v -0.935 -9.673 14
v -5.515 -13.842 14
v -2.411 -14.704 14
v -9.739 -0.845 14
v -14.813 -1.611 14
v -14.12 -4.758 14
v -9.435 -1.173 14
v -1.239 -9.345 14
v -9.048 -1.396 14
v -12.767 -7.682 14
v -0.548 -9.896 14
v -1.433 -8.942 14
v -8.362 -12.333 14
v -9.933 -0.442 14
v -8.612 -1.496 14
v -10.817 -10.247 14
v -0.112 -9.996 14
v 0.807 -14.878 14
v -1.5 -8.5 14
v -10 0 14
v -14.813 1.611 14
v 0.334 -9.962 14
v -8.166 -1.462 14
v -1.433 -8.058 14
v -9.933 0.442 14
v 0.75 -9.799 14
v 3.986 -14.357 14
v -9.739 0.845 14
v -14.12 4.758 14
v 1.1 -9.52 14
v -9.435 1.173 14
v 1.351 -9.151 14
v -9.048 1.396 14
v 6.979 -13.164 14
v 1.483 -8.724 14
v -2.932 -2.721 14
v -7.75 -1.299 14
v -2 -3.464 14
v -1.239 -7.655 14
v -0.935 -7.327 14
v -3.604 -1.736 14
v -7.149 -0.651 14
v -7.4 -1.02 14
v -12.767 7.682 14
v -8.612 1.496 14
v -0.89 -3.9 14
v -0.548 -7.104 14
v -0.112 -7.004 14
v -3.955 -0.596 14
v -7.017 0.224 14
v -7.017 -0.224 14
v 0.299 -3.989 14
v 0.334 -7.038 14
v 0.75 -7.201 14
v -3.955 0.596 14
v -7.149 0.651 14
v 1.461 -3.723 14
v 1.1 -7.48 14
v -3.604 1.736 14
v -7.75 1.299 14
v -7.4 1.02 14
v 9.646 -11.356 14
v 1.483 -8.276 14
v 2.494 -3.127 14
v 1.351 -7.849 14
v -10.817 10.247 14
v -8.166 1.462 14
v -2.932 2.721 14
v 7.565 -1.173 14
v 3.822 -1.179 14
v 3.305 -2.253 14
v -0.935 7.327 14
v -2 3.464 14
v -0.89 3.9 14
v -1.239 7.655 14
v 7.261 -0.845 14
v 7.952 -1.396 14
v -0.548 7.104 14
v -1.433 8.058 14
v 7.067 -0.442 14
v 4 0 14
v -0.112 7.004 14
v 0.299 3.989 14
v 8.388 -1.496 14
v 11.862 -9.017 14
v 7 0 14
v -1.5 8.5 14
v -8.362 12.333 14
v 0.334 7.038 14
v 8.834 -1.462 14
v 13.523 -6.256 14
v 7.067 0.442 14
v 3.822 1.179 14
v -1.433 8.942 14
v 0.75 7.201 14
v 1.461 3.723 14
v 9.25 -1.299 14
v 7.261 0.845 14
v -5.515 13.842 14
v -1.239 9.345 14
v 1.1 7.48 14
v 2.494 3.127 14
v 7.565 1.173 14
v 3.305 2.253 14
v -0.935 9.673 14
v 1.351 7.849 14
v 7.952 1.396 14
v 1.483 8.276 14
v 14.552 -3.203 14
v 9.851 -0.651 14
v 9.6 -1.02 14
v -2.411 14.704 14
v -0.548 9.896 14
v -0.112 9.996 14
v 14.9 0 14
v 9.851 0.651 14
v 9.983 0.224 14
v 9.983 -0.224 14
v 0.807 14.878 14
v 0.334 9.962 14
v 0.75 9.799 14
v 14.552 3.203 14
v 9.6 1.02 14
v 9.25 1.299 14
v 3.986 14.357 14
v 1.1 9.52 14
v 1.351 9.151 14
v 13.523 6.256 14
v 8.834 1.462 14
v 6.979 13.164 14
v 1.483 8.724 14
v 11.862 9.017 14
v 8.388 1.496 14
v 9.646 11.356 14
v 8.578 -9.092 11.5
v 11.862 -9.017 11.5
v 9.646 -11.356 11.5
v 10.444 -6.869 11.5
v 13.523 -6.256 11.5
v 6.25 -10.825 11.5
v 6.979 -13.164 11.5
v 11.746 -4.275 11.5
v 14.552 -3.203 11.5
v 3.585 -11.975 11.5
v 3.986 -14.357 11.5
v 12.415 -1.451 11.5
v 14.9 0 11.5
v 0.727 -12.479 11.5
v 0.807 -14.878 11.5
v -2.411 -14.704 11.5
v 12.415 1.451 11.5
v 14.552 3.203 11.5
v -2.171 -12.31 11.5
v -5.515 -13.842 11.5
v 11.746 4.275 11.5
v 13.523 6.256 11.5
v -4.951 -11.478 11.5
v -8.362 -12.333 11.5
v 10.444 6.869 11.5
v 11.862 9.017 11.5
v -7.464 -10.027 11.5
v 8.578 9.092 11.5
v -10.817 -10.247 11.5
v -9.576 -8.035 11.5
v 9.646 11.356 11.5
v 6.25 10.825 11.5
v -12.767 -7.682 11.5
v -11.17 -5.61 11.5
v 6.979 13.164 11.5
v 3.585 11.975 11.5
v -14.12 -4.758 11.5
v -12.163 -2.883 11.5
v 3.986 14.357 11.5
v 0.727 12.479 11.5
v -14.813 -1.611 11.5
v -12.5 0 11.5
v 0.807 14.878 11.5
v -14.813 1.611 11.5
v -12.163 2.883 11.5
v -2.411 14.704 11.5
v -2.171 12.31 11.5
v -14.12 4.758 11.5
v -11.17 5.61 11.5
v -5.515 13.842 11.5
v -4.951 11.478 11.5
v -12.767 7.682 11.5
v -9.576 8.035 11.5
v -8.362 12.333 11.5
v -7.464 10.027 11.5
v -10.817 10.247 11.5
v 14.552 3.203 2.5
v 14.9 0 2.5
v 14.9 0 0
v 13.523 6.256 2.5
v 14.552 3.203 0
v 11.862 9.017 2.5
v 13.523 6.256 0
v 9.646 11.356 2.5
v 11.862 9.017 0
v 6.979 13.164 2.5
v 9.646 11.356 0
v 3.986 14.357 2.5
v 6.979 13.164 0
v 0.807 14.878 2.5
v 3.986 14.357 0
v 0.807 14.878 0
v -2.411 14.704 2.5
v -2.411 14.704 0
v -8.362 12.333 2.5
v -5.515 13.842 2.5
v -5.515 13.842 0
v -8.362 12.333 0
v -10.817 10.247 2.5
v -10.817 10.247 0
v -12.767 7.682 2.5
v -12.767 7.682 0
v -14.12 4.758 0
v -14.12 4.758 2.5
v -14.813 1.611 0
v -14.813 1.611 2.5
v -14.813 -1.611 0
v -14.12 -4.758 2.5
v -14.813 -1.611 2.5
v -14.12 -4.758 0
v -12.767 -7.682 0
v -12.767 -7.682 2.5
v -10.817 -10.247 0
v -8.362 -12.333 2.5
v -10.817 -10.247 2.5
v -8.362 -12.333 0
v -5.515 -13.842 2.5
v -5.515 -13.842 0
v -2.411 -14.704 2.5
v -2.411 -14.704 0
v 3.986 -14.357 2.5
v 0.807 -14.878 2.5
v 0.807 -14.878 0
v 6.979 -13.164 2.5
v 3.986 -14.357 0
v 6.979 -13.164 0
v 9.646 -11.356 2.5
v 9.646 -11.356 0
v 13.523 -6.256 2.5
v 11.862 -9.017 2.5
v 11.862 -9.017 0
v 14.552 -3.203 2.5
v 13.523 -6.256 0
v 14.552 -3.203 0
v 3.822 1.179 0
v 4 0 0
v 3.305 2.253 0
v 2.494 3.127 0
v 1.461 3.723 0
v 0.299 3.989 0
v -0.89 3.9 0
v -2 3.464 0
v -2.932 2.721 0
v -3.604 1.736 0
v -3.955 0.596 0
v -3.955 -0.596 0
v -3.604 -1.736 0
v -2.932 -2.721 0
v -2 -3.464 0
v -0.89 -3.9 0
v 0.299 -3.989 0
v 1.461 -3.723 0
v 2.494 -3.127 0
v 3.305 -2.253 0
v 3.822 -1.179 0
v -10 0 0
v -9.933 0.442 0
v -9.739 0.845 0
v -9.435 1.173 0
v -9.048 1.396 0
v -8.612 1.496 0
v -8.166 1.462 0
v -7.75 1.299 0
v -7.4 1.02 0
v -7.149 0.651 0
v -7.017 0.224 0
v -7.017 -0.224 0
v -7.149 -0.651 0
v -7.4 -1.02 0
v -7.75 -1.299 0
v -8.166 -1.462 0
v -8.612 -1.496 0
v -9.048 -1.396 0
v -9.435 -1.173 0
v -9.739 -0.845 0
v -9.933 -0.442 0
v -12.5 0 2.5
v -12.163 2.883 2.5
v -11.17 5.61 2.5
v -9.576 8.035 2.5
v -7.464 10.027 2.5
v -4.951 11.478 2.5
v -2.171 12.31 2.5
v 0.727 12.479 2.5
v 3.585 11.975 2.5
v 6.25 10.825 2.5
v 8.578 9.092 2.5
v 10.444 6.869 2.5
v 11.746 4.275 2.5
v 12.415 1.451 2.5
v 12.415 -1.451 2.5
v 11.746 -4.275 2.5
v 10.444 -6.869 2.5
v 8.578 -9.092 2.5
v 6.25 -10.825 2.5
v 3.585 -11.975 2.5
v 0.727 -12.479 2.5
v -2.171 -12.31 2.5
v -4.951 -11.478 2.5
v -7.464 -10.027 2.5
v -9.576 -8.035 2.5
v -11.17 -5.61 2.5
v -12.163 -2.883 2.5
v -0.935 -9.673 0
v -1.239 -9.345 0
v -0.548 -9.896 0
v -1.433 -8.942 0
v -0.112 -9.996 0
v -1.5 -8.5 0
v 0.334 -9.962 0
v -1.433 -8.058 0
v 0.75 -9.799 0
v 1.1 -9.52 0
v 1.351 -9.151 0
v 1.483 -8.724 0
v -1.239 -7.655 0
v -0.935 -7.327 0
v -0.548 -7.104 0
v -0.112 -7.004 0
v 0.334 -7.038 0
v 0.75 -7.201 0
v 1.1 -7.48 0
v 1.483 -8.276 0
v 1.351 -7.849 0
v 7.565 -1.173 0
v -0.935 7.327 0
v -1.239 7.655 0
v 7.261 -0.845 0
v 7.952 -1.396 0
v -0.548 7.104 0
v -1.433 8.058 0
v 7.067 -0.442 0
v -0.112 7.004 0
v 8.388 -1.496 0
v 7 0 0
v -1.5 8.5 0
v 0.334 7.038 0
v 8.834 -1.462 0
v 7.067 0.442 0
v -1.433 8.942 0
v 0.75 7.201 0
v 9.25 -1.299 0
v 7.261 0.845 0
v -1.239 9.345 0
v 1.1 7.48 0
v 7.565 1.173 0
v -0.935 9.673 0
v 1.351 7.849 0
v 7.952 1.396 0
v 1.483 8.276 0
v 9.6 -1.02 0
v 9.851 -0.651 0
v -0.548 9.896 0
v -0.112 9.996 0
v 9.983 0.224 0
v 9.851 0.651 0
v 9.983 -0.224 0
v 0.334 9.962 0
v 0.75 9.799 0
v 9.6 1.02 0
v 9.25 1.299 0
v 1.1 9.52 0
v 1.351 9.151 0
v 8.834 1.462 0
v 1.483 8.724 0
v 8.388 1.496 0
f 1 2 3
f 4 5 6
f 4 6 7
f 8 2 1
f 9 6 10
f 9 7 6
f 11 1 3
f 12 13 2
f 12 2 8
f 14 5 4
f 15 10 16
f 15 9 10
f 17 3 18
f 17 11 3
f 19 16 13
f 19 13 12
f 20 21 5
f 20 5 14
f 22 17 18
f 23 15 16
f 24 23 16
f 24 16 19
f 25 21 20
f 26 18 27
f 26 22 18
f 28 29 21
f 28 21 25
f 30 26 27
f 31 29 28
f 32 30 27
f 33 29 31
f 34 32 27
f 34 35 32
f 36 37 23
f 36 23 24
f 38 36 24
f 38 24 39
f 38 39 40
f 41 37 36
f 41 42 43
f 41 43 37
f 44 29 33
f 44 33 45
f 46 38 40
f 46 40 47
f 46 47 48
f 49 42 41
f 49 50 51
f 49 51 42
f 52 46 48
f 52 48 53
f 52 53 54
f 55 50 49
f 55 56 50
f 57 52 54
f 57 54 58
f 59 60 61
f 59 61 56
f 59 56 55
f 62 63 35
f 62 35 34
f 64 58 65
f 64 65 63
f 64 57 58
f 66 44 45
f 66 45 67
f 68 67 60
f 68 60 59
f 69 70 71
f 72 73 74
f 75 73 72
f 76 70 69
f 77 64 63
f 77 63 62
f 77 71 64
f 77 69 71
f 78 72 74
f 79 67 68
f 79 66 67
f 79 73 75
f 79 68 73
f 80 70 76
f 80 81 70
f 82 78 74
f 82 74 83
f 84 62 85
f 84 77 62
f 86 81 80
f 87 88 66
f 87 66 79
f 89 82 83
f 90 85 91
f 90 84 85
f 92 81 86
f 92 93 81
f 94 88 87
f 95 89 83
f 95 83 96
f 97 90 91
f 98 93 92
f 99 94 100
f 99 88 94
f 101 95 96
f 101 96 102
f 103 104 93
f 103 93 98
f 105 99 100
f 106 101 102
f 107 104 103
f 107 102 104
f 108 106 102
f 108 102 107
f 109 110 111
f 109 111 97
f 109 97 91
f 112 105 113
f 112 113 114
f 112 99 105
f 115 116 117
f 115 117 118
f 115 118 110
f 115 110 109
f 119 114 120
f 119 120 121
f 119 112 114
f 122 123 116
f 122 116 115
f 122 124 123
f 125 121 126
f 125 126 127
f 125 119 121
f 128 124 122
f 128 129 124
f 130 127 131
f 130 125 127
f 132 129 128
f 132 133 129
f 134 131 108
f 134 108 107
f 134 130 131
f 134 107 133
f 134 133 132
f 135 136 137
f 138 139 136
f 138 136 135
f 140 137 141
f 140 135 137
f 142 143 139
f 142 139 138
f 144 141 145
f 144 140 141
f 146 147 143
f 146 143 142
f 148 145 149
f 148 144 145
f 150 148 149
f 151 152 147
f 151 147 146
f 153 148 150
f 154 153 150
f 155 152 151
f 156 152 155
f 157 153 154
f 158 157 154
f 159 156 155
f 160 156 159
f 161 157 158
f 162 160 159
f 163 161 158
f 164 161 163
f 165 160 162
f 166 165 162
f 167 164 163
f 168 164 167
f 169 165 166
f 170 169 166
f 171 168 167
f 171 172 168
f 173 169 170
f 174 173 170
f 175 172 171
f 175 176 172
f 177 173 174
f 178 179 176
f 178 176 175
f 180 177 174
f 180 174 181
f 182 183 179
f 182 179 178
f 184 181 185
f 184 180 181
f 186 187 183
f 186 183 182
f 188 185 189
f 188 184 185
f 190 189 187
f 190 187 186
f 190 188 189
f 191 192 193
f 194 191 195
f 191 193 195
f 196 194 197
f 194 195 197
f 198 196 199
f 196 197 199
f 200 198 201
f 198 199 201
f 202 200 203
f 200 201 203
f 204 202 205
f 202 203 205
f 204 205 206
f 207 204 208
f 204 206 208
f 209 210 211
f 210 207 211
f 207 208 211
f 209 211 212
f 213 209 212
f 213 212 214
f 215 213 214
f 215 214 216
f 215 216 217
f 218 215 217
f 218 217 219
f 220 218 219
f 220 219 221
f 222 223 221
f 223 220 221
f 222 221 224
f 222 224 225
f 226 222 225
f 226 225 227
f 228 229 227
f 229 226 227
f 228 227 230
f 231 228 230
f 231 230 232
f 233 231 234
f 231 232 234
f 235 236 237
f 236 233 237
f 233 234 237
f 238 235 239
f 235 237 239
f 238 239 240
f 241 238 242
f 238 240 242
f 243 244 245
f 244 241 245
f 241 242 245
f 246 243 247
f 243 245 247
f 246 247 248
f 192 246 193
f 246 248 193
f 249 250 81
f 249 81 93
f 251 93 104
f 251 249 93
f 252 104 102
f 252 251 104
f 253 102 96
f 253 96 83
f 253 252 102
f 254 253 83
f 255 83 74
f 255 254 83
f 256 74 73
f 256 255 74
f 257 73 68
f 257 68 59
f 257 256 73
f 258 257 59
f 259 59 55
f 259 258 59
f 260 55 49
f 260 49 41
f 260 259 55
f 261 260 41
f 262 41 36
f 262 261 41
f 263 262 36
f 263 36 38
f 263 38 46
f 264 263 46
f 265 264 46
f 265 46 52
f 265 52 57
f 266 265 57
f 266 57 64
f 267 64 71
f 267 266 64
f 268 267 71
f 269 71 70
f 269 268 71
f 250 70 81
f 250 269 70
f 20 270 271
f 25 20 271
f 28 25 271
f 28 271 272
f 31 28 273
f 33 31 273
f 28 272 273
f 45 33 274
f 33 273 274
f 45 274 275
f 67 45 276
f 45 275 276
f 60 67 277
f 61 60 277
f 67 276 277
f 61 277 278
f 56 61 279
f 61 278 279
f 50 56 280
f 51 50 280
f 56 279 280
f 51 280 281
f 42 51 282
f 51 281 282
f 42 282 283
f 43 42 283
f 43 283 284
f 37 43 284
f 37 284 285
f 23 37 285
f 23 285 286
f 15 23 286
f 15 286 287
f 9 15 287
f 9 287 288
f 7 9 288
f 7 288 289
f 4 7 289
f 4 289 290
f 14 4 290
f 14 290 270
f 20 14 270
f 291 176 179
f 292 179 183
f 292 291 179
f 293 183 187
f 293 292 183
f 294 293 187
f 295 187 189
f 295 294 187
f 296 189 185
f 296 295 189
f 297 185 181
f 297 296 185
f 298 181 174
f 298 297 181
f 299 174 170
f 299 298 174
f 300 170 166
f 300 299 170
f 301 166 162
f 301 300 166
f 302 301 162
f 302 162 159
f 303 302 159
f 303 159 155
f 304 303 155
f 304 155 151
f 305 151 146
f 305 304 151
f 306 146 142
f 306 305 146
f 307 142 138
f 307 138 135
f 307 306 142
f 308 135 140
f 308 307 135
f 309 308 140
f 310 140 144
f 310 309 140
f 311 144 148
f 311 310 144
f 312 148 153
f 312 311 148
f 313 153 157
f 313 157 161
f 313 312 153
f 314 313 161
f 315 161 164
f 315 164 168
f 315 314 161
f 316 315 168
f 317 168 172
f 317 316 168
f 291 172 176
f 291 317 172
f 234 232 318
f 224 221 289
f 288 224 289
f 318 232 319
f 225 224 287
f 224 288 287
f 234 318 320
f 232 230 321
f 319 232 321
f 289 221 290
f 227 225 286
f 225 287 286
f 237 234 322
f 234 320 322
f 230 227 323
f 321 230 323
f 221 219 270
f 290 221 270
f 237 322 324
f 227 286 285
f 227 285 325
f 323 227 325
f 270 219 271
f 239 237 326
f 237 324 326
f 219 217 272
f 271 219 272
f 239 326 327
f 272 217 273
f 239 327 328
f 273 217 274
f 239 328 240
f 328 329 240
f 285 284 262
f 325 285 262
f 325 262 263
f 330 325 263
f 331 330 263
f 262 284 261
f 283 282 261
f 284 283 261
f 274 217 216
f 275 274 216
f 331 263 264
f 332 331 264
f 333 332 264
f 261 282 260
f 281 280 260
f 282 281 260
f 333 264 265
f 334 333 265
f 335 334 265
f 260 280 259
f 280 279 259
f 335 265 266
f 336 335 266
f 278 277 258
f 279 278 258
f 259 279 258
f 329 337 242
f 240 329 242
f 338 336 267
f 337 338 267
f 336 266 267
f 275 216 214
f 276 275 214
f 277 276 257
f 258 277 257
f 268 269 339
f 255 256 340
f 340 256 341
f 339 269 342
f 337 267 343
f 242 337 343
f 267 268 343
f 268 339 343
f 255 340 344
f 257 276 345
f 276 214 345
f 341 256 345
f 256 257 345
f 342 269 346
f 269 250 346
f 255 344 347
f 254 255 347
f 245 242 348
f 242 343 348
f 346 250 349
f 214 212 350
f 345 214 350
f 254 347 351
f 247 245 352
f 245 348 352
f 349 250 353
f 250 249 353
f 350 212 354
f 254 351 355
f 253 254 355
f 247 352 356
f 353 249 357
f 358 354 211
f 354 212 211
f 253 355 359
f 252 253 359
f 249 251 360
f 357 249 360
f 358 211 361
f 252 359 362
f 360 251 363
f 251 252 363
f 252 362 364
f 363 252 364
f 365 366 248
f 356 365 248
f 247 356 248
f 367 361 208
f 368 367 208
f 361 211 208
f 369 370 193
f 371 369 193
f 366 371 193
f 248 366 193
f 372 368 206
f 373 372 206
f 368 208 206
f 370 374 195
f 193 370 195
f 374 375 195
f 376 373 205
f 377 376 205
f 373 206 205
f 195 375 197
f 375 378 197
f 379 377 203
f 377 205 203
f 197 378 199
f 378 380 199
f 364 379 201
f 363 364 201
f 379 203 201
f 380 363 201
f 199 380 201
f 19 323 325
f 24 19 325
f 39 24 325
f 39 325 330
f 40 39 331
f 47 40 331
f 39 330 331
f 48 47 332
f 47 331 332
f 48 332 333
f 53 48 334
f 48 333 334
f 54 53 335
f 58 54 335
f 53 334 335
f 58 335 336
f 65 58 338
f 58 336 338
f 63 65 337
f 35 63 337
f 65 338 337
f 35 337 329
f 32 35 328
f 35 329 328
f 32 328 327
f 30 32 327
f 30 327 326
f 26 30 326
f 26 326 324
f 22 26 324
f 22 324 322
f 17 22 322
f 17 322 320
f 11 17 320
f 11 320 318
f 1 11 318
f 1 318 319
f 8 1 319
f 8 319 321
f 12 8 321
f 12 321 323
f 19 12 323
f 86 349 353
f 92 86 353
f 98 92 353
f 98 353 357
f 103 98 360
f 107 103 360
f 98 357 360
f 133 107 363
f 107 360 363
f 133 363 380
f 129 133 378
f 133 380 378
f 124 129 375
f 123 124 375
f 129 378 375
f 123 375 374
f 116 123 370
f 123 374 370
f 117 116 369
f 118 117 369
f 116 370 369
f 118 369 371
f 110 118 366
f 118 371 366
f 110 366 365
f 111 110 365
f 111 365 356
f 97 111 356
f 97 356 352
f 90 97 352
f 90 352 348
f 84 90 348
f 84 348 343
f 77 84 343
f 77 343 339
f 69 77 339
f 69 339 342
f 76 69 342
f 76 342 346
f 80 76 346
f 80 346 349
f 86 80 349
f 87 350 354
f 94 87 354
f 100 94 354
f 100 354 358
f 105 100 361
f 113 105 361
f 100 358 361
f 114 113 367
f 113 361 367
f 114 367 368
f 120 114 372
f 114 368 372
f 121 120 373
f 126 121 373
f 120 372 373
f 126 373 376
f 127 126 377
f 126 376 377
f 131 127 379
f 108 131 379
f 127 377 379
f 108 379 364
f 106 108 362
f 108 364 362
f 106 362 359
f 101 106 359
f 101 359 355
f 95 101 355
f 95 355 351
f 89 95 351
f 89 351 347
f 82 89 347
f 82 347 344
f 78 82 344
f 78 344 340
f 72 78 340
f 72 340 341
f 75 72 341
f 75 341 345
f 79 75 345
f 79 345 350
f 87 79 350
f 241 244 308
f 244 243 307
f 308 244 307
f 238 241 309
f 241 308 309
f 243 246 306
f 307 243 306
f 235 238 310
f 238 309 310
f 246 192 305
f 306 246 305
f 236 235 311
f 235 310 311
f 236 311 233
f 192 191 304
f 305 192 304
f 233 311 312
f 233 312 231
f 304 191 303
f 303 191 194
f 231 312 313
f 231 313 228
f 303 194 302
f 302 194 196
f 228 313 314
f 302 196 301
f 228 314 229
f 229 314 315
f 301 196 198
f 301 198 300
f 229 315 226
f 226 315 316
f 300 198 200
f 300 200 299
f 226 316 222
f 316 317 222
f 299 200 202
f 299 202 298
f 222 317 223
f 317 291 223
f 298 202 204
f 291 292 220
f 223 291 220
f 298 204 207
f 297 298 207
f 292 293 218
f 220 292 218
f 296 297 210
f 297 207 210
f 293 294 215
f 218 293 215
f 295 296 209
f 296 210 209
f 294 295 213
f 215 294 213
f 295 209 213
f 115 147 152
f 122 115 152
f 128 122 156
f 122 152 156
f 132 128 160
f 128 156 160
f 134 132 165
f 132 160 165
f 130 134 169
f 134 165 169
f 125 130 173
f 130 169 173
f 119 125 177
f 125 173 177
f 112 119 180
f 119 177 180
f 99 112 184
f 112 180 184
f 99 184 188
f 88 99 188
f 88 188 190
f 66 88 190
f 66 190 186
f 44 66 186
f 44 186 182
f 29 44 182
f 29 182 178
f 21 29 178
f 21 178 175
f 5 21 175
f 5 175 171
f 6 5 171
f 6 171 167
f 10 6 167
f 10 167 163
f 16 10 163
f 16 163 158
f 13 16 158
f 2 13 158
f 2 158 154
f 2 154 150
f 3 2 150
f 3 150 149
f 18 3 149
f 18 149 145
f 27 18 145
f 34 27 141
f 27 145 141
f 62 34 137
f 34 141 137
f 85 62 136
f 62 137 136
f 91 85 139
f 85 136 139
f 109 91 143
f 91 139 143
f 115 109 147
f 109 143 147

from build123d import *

# Parameters (mm, degrees)
SKETCH1_R           = 14.9
SKETCH1_R_2         = 4
BOSS_EXTRUDE1_DEPTH = 14
SKETCH2_R           = 14.9
SKETCH2_R_2         = 12.5
CUT_EXTRUDE1_DEPTH  = 9
SKETCH3_R           = 1.5
CUT_EXTRUDE2_DEPTH  = 26.298616563


with BuildPart() as part:
    # Sketch1 → Boss-Extrude1 (new body)
    with BuildSketch(Plane.XY):
        Circle(SKETCH1_R)
        Circle(SKETCH1_R_2, mode=Mode.SUBTRACT)
    extrude(amount=BOSS_EXTRUDE1_DEPTH)

    # Sketch2 → Cut-Extrude1 (cut)
    with BuildSketch(Plane(origin=(0, 0, 2.5), x_dir=(-1, 0, 0), z_dir=(0, 0, -1))):
        Circle(SKETCH2_R)
        Circle(SKETCH2_R_2, mode=Mode.SUBTRACT)
    extrude(amount=-CUT_EXTRUDE1_DEPTH, mode=Mode.SUBTRACT)

    # Sketch3 → Cut-Extrude2 (cut, through all)
    with BuildSketch(Plane(origin=(0, 0, 0), x_dir=(-1, 0, 0), z_dir=(0, 0, -1))):
        with Locations((0, 8.5)):
            Circle(SKETCH3_R)
        with Locations((8.5, 0)):
            Circle(SKETCH3_R)
        with Locations((0, -8.5)):
            Circle(SKETCH3_R)
        with Locations((-8.5, 0)):
            Circle(SKETCH3_R)
    extrude(amount=-CUT_EXTRUDE2_DEPTH, mode=Mode.SUBTRACT)


solid = part.part
